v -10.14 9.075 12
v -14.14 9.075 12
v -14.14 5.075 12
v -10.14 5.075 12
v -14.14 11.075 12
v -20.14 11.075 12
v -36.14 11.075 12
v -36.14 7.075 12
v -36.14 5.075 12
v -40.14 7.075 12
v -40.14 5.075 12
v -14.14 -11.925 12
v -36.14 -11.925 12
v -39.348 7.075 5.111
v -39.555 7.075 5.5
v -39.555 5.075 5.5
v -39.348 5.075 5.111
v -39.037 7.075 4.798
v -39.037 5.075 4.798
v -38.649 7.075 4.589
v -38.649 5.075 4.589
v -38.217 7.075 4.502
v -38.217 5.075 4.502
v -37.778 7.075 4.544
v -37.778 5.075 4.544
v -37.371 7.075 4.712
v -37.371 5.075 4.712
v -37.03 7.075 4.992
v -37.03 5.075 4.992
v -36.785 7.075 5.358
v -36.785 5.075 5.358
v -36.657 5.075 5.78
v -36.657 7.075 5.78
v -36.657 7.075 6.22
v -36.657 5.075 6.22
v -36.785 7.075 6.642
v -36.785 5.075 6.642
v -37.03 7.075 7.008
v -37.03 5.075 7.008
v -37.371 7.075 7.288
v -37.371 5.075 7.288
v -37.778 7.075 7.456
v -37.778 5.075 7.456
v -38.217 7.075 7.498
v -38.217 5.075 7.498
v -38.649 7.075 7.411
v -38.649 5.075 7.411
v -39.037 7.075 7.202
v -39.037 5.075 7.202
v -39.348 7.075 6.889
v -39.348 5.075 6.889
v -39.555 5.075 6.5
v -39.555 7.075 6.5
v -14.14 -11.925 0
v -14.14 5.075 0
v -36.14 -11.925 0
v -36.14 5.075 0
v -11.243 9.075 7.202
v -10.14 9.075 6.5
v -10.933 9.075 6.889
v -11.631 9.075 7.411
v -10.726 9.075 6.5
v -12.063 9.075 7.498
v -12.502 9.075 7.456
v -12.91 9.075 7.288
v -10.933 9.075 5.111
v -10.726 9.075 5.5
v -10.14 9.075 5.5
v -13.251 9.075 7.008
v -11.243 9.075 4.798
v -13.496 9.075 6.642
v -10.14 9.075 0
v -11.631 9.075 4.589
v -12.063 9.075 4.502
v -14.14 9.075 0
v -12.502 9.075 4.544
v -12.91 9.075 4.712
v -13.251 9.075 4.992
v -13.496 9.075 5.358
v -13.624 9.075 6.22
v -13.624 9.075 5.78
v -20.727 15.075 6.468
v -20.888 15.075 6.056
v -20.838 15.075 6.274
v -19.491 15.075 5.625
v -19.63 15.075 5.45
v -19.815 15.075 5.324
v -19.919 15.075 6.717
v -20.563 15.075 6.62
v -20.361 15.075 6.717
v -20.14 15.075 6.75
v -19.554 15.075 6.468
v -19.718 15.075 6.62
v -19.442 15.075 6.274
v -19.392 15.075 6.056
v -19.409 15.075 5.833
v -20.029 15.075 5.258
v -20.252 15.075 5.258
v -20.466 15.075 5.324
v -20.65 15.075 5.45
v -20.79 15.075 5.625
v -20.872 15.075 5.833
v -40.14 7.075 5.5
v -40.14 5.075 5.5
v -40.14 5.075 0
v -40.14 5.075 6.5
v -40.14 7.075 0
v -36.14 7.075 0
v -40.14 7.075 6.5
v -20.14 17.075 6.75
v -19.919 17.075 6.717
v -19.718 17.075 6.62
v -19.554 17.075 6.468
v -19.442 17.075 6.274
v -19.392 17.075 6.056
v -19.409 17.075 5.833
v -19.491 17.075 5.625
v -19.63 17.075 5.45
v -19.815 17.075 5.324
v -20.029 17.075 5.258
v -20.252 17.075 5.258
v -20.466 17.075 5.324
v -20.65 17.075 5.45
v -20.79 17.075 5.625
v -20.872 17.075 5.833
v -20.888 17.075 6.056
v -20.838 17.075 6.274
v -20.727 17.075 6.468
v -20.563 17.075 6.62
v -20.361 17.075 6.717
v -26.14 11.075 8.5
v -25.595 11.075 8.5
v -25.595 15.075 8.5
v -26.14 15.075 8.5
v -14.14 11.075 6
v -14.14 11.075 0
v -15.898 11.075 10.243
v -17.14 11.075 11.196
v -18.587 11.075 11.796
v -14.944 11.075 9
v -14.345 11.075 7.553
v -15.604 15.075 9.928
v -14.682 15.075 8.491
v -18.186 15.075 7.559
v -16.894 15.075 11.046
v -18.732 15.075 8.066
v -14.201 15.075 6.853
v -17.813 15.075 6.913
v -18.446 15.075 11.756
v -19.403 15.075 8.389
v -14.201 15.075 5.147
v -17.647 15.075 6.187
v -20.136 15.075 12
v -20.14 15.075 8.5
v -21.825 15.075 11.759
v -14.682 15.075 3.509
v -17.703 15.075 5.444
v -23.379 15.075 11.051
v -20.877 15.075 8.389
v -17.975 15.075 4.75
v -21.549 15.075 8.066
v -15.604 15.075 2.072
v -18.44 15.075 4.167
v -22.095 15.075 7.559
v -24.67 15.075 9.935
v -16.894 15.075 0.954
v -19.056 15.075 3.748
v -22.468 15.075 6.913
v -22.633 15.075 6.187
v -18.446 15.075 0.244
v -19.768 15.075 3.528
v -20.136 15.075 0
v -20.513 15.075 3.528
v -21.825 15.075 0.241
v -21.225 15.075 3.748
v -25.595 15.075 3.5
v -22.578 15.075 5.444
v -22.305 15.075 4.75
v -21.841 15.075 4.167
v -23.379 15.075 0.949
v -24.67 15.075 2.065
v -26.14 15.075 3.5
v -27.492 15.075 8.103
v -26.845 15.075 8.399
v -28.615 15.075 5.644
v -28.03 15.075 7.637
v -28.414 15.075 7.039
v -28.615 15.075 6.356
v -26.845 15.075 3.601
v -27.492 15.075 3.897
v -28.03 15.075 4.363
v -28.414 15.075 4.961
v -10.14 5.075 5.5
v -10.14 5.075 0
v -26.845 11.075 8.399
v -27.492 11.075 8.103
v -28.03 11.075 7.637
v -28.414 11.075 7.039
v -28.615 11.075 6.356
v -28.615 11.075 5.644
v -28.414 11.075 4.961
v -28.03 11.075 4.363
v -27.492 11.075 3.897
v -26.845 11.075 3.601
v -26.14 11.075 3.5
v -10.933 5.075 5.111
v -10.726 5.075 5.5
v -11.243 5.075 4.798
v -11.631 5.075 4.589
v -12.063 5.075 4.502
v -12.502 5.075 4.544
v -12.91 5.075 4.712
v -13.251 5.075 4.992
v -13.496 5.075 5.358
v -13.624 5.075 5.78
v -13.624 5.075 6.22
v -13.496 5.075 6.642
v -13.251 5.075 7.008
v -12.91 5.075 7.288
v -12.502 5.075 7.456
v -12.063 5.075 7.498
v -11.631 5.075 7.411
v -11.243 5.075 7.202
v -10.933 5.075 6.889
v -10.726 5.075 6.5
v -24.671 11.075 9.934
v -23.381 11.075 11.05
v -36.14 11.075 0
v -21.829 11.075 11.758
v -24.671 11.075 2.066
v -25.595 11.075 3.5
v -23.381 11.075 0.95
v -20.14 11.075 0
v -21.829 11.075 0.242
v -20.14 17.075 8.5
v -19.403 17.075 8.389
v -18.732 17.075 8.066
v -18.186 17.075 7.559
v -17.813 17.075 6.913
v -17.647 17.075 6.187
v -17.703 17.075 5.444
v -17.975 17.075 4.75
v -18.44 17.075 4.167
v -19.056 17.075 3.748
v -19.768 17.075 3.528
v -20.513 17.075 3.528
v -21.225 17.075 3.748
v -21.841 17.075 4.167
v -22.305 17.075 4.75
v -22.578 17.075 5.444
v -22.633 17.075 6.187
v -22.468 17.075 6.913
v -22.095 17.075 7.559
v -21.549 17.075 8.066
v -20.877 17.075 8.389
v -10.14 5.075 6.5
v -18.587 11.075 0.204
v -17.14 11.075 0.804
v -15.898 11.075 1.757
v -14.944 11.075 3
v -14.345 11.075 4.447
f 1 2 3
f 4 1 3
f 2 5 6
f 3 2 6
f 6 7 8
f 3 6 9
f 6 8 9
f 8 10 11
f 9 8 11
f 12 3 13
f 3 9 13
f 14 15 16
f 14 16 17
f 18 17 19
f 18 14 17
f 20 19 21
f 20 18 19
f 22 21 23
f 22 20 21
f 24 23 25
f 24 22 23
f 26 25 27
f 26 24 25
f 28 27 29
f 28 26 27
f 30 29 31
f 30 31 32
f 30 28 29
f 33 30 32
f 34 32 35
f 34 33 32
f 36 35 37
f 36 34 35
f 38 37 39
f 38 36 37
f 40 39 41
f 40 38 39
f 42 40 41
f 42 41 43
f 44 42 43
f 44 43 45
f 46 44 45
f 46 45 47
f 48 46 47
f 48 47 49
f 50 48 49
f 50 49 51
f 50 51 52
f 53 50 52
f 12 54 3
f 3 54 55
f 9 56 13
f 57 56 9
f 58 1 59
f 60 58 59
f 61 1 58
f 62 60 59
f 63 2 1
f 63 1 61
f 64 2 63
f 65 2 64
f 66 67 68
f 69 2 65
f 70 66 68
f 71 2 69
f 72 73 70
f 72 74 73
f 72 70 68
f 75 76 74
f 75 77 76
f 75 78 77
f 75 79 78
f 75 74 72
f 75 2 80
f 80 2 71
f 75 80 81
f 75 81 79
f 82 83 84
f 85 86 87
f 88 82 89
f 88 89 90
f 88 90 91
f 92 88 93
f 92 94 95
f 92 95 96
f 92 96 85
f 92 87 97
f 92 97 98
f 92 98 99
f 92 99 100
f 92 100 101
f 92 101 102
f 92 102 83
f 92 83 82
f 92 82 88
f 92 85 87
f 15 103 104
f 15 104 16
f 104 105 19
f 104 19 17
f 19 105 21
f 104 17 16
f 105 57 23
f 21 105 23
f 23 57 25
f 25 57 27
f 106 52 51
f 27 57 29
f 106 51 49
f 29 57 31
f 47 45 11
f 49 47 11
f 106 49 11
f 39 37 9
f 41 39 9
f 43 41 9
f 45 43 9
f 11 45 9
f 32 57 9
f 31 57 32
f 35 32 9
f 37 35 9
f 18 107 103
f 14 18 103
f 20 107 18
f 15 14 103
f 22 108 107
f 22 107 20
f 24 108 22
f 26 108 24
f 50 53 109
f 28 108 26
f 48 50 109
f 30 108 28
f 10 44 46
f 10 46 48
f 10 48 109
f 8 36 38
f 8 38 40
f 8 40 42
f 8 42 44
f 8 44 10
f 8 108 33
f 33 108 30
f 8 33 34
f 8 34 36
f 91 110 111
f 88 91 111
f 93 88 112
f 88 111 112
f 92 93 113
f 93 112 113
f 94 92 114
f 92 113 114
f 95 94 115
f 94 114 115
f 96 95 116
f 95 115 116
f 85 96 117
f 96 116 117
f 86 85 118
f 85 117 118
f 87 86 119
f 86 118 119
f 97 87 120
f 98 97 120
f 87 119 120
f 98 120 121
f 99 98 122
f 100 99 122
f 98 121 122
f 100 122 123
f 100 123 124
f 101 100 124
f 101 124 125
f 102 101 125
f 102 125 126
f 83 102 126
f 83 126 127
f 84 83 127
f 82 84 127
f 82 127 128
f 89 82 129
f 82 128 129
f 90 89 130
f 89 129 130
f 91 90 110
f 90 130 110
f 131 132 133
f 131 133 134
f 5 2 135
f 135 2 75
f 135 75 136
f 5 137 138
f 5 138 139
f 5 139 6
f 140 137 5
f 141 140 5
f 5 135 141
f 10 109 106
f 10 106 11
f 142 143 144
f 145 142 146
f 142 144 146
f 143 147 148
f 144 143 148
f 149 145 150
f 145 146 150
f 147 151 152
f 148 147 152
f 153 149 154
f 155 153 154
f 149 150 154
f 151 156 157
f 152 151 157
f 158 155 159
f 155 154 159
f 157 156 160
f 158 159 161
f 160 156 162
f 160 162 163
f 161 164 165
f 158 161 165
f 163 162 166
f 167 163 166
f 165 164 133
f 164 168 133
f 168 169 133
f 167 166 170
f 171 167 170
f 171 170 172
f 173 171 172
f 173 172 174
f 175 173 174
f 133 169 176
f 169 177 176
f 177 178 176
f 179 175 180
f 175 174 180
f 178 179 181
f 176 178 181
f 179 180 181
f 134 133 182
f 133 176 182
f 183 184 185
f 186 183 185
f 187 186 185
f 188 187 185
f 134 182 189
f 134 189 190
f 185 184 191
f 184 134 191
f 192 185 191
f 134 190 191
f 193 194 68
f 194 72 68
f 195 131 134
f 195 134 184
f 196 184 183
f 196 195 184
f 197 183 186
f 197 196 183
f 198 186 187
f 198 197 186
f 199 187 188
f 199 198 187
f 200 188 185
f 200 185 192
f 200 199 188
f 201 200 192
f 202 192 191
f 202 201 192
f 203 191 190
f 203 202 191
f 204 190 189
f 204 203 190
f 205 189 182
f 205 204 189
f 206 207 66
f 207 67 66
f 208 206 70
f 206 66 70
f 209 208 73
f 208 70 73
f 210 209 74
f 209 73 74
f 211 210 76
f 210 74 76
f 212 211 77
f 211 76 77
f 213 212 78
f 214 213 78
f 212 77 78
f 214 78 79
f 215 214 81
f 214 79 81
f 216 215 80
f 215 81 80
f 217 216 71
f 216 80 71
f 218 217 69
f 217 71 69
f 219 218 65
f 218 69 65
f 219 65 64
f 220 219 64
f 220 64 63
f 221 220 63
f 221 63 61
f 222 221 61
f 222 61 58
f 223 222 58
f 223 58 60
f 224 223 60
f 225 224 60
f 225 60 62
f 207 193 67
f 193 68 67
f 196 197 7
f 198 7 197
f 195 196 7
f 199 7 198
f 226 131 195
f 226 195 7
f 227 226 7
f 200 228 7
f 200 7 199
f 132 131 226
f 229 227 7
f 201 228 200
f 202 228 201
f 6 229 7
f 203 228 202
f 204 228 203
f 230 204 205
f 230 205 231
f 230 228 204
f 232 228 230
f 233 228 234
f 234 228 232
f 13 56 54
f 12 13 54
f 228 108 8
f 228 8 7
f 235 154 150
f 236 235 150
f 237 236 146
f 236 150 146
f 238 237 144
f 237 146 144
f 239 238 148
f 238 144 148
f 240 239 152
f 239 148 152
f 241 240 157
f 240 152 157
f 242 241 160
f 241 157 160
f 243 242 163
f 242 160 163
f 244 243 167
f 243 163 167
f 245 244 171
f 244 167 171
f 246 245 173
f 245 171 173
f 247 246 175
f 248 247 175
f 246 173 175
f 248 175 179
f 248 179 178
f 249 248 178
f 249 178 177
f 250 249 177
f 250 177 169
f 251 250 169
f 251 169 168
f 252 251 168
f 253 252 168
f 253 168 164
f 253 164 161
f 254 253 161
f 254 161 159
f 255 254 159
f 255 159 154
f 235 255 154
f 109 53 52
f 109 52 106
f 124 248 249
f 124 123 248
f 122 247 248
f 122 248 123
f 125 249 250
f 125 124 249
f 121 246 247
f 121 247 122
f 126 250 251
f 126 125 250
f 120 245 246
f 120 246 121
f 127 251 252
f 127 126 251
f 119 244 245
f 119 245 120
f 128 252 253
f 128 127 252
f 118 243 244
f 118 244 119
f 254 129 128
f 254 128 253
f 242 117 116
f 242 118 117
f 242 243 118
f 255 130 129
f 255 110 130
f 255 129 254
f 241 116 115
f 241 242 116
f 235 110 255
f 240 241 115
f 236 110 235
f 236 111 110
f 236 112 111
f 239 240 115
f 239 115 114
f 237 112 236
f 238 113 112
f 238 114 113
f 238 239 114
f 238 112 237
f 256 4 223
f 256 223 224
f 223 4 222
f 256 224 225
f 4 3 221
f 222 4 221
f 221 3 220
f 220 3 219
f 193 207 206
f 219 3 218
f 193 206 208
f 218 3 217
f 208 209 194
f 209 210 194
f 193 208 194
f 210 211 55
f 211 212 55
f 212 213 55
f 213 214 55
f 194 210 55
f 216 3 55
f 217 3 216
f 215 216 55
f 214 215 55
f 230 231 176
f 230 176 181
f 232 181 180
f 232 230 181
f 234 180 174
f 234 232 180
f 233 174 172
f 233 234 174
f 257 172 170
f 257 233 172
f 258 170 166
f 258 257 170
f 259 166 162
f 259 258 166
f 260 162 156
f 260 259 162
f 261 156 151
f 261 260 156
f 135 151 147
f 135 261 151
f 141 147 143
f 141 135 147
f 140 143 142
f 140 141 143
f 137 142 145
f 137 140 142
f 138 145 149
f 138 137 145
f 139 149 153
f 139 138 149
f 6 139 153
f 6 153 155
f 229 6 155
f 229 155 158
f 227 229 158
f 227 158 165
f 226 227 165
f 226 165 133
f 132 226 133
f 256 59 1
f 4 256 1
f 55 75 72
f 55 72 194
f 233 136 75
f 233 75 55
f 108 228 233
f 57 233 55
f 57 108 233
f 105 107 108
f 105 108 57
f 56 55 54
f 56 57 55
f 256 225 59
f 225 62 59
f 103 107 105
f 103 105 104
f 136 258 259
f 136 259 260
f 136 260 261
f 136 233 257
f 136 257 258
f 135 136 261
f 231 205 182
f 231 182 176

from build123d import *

# Parameters (mm, degrees)
CROQUIS1_W              = 22
CROQUIS1_H              = 23
SALIENTE_EXTRUIR1_DEPTH = 12
CROQUIS2_W              = 12
CROQUIS2_H              = 2
SALIENTE_EXTRUIR2_DEPTH = 5
CORTAR_EXTRUIR2_DEPTH   = 2
CROQUIS13_W             = 12
CROQUIS13_H             = 2
SALIENTE_EXTRUIR3_DEPTH = 4
CORTAR_EXTRUIR3_DEPTH   = 2
SALIENTE_EXTRUIR4_DEPTH = 4
CROQUIS16_R             = 2.5
SALIENTE_EXTRUIR5_DEPTH = 6
CROQUIS21_R             = 0.75
CORTAR_EXTRUIR6_DEPTH   = 2


with BuildPart() as part:
    # Croquis1 → Saliente-Extruir1 (new body)
    with BuildSketch(Plane.XY):
        with Locations((-25.140327955, -0.424857882)):
            Rectangle(CROQUIS1_W, CROQUIS1_H)
    extrude(amount=SALIENTE_EXTRUIR1_DEPTH)

    # Croquis2 → Saliente-Extruir2 (add)
    with BuildSketch(Plane(origin=(-14.140327955, 0, 0), x_dir=(0, 0, -1), z_dir=(1, 0, 0))):
        with Locations((-6, 6.075142118)):
            Rectangle(CROQUIS2_W, CROQUIS2_H)
    saliente_extruir2 = extrude(amount=SALIENTE_EXTRUIR2_DEPTH)

    # Croquis3 → Cortar-Extruir2 (cut)
    with BuildSketch(Plane(origin=(0, 7.075142118, 0), x_dir=(1, 0, 0), z_dir=(0, 1, 0))):
        with BuildLine():
            Line((-10.140327955, -5.5), (-10.726114393, -5.5))
            ThreePointArc((-10.726114393, -5.5), (-13.640327955, -6), (-10.726114393, -6.5))
            Line((-10.726114393, -6.5), (-10.140327955, -6.5))
            Line((-10.140327955, -6.5), (-10.140327955, -12))
            Line((-10.140327955, -12), (-9.140327955, -12))
            Line((-9.140327955, -12), (-9.140327955, 0))
            Line((-9.140327955, 0), (-10.140327955, 0))
            Line((-10.140327955, 0), (-10.140327955, -5.5))
        make_face()
    cortar_extruir2 = extrude(amount=-CORTAR_EXTRUIR2_DEPTH, mode=Mode.SUBTRACT)

    # Simetría1: Saliente-Extruir2, Cortar-Extruir2 across plane
    add(saliente_extruir2.mirror(Plane(origin=(-9.140327955, 7.075142118, 12), x_dir=(0, 0, 1), z_dir=(0, -1, 0))))
    add(cortar_extruir2.mirror(Plane(origin=(-9.140327955, 7.075142118, 12), x_dir=(0, 0, 1), z_dir=(0, -1, 0))), mode=Mode.SUBTRACT)

    # Croquis13 → Saliente-Extruir3 (add)
    with BuildSketch(Plane.ZY.offset(36.140327955)):
        with Locations((6, 6.075142118)):
            Rectangle(CROQUIS13_W, CROQUIS13_H)
    extrude(amount=SALIENTE_EXTRUIR3_DEPTH)

    # Croquis14 → Cortar-Extruir3 (cut)
    with BuildSketch(Plane(origin=(0, 7.075142118, 0), x_dir=(1, 0, 0), z_dir=(0, 1, 0))):
        with BuildLine():
            Line((-40.140327955, -6.5), (-40.140327955, -5.5))
            Line((-40.140327955, -5.5), (-39.554541518, -5.5))
            ThreePointArc((-39.554541518, -5.5), (-36.640327955, -6), (-39.554541518, -6.5))
            Line((-39.554541518, -6.5), (-40.140327955, -6.5))
        make_face()
    extrude(amount=-CORTAR_EXTRUIR3_DEPTH, mode=Mode.SUBTRACT)

    # Croquis15 → Saliente-Extruir4 (add)
    with BuildSketch(Plane(origin=(0, 11.075142118, 0), x_dir=(1, 0, 0), z_dir=(0, 1, 0))):
        with BuildLine():
            ThreePointArc((-25.594684013, -3.5), (-14.140327955, -6), (-25.594684013, -8.5))
            Line((-25.594684013, -8.5), (-26.140327955, -8.5))
            ThreePointArc((-26.140327955, -8.5), (-28.640327955, -6), (-26.140327955, -3.5))
            Line((-26.140327955, -3.5), (-25.594684013, -3.5))
        make_face()
    extrude(amount=SALIENTE_EXTRUIR4_DEPTH)

    # Croquis16 → Saliente-Extruir5 (add)
    with BuildSketch(Plane(origin=(0, 11.075142118, 0), x_dir=(1, 0, 0), z_dir=(0, 1, 0))):
        with Locations(Location((-20.140327955, -6, 0), (0, 0, 270))):
            Circle(CROQUIS16_R)
    extrude(amount=SALIENTE_EXTRUIR5_DEPTH)

    # Croquis21 → Cortar-Extruir6 (cut)
    with BuildSketch(Plane(origin=(0, 17.075142118, 0), x_dir=(1, 0, 0), z_dir=(0, 1, 0))):
        with Locations(Location((-20.140327955, -6, 0), (0, 0, 270))):
            Circle(CROQUIS21_R)
    extrude(amount=-CORTAR_EXTRUIR6_DEPTH, mode=Mode.SUBTRACT)


solid = part.part
